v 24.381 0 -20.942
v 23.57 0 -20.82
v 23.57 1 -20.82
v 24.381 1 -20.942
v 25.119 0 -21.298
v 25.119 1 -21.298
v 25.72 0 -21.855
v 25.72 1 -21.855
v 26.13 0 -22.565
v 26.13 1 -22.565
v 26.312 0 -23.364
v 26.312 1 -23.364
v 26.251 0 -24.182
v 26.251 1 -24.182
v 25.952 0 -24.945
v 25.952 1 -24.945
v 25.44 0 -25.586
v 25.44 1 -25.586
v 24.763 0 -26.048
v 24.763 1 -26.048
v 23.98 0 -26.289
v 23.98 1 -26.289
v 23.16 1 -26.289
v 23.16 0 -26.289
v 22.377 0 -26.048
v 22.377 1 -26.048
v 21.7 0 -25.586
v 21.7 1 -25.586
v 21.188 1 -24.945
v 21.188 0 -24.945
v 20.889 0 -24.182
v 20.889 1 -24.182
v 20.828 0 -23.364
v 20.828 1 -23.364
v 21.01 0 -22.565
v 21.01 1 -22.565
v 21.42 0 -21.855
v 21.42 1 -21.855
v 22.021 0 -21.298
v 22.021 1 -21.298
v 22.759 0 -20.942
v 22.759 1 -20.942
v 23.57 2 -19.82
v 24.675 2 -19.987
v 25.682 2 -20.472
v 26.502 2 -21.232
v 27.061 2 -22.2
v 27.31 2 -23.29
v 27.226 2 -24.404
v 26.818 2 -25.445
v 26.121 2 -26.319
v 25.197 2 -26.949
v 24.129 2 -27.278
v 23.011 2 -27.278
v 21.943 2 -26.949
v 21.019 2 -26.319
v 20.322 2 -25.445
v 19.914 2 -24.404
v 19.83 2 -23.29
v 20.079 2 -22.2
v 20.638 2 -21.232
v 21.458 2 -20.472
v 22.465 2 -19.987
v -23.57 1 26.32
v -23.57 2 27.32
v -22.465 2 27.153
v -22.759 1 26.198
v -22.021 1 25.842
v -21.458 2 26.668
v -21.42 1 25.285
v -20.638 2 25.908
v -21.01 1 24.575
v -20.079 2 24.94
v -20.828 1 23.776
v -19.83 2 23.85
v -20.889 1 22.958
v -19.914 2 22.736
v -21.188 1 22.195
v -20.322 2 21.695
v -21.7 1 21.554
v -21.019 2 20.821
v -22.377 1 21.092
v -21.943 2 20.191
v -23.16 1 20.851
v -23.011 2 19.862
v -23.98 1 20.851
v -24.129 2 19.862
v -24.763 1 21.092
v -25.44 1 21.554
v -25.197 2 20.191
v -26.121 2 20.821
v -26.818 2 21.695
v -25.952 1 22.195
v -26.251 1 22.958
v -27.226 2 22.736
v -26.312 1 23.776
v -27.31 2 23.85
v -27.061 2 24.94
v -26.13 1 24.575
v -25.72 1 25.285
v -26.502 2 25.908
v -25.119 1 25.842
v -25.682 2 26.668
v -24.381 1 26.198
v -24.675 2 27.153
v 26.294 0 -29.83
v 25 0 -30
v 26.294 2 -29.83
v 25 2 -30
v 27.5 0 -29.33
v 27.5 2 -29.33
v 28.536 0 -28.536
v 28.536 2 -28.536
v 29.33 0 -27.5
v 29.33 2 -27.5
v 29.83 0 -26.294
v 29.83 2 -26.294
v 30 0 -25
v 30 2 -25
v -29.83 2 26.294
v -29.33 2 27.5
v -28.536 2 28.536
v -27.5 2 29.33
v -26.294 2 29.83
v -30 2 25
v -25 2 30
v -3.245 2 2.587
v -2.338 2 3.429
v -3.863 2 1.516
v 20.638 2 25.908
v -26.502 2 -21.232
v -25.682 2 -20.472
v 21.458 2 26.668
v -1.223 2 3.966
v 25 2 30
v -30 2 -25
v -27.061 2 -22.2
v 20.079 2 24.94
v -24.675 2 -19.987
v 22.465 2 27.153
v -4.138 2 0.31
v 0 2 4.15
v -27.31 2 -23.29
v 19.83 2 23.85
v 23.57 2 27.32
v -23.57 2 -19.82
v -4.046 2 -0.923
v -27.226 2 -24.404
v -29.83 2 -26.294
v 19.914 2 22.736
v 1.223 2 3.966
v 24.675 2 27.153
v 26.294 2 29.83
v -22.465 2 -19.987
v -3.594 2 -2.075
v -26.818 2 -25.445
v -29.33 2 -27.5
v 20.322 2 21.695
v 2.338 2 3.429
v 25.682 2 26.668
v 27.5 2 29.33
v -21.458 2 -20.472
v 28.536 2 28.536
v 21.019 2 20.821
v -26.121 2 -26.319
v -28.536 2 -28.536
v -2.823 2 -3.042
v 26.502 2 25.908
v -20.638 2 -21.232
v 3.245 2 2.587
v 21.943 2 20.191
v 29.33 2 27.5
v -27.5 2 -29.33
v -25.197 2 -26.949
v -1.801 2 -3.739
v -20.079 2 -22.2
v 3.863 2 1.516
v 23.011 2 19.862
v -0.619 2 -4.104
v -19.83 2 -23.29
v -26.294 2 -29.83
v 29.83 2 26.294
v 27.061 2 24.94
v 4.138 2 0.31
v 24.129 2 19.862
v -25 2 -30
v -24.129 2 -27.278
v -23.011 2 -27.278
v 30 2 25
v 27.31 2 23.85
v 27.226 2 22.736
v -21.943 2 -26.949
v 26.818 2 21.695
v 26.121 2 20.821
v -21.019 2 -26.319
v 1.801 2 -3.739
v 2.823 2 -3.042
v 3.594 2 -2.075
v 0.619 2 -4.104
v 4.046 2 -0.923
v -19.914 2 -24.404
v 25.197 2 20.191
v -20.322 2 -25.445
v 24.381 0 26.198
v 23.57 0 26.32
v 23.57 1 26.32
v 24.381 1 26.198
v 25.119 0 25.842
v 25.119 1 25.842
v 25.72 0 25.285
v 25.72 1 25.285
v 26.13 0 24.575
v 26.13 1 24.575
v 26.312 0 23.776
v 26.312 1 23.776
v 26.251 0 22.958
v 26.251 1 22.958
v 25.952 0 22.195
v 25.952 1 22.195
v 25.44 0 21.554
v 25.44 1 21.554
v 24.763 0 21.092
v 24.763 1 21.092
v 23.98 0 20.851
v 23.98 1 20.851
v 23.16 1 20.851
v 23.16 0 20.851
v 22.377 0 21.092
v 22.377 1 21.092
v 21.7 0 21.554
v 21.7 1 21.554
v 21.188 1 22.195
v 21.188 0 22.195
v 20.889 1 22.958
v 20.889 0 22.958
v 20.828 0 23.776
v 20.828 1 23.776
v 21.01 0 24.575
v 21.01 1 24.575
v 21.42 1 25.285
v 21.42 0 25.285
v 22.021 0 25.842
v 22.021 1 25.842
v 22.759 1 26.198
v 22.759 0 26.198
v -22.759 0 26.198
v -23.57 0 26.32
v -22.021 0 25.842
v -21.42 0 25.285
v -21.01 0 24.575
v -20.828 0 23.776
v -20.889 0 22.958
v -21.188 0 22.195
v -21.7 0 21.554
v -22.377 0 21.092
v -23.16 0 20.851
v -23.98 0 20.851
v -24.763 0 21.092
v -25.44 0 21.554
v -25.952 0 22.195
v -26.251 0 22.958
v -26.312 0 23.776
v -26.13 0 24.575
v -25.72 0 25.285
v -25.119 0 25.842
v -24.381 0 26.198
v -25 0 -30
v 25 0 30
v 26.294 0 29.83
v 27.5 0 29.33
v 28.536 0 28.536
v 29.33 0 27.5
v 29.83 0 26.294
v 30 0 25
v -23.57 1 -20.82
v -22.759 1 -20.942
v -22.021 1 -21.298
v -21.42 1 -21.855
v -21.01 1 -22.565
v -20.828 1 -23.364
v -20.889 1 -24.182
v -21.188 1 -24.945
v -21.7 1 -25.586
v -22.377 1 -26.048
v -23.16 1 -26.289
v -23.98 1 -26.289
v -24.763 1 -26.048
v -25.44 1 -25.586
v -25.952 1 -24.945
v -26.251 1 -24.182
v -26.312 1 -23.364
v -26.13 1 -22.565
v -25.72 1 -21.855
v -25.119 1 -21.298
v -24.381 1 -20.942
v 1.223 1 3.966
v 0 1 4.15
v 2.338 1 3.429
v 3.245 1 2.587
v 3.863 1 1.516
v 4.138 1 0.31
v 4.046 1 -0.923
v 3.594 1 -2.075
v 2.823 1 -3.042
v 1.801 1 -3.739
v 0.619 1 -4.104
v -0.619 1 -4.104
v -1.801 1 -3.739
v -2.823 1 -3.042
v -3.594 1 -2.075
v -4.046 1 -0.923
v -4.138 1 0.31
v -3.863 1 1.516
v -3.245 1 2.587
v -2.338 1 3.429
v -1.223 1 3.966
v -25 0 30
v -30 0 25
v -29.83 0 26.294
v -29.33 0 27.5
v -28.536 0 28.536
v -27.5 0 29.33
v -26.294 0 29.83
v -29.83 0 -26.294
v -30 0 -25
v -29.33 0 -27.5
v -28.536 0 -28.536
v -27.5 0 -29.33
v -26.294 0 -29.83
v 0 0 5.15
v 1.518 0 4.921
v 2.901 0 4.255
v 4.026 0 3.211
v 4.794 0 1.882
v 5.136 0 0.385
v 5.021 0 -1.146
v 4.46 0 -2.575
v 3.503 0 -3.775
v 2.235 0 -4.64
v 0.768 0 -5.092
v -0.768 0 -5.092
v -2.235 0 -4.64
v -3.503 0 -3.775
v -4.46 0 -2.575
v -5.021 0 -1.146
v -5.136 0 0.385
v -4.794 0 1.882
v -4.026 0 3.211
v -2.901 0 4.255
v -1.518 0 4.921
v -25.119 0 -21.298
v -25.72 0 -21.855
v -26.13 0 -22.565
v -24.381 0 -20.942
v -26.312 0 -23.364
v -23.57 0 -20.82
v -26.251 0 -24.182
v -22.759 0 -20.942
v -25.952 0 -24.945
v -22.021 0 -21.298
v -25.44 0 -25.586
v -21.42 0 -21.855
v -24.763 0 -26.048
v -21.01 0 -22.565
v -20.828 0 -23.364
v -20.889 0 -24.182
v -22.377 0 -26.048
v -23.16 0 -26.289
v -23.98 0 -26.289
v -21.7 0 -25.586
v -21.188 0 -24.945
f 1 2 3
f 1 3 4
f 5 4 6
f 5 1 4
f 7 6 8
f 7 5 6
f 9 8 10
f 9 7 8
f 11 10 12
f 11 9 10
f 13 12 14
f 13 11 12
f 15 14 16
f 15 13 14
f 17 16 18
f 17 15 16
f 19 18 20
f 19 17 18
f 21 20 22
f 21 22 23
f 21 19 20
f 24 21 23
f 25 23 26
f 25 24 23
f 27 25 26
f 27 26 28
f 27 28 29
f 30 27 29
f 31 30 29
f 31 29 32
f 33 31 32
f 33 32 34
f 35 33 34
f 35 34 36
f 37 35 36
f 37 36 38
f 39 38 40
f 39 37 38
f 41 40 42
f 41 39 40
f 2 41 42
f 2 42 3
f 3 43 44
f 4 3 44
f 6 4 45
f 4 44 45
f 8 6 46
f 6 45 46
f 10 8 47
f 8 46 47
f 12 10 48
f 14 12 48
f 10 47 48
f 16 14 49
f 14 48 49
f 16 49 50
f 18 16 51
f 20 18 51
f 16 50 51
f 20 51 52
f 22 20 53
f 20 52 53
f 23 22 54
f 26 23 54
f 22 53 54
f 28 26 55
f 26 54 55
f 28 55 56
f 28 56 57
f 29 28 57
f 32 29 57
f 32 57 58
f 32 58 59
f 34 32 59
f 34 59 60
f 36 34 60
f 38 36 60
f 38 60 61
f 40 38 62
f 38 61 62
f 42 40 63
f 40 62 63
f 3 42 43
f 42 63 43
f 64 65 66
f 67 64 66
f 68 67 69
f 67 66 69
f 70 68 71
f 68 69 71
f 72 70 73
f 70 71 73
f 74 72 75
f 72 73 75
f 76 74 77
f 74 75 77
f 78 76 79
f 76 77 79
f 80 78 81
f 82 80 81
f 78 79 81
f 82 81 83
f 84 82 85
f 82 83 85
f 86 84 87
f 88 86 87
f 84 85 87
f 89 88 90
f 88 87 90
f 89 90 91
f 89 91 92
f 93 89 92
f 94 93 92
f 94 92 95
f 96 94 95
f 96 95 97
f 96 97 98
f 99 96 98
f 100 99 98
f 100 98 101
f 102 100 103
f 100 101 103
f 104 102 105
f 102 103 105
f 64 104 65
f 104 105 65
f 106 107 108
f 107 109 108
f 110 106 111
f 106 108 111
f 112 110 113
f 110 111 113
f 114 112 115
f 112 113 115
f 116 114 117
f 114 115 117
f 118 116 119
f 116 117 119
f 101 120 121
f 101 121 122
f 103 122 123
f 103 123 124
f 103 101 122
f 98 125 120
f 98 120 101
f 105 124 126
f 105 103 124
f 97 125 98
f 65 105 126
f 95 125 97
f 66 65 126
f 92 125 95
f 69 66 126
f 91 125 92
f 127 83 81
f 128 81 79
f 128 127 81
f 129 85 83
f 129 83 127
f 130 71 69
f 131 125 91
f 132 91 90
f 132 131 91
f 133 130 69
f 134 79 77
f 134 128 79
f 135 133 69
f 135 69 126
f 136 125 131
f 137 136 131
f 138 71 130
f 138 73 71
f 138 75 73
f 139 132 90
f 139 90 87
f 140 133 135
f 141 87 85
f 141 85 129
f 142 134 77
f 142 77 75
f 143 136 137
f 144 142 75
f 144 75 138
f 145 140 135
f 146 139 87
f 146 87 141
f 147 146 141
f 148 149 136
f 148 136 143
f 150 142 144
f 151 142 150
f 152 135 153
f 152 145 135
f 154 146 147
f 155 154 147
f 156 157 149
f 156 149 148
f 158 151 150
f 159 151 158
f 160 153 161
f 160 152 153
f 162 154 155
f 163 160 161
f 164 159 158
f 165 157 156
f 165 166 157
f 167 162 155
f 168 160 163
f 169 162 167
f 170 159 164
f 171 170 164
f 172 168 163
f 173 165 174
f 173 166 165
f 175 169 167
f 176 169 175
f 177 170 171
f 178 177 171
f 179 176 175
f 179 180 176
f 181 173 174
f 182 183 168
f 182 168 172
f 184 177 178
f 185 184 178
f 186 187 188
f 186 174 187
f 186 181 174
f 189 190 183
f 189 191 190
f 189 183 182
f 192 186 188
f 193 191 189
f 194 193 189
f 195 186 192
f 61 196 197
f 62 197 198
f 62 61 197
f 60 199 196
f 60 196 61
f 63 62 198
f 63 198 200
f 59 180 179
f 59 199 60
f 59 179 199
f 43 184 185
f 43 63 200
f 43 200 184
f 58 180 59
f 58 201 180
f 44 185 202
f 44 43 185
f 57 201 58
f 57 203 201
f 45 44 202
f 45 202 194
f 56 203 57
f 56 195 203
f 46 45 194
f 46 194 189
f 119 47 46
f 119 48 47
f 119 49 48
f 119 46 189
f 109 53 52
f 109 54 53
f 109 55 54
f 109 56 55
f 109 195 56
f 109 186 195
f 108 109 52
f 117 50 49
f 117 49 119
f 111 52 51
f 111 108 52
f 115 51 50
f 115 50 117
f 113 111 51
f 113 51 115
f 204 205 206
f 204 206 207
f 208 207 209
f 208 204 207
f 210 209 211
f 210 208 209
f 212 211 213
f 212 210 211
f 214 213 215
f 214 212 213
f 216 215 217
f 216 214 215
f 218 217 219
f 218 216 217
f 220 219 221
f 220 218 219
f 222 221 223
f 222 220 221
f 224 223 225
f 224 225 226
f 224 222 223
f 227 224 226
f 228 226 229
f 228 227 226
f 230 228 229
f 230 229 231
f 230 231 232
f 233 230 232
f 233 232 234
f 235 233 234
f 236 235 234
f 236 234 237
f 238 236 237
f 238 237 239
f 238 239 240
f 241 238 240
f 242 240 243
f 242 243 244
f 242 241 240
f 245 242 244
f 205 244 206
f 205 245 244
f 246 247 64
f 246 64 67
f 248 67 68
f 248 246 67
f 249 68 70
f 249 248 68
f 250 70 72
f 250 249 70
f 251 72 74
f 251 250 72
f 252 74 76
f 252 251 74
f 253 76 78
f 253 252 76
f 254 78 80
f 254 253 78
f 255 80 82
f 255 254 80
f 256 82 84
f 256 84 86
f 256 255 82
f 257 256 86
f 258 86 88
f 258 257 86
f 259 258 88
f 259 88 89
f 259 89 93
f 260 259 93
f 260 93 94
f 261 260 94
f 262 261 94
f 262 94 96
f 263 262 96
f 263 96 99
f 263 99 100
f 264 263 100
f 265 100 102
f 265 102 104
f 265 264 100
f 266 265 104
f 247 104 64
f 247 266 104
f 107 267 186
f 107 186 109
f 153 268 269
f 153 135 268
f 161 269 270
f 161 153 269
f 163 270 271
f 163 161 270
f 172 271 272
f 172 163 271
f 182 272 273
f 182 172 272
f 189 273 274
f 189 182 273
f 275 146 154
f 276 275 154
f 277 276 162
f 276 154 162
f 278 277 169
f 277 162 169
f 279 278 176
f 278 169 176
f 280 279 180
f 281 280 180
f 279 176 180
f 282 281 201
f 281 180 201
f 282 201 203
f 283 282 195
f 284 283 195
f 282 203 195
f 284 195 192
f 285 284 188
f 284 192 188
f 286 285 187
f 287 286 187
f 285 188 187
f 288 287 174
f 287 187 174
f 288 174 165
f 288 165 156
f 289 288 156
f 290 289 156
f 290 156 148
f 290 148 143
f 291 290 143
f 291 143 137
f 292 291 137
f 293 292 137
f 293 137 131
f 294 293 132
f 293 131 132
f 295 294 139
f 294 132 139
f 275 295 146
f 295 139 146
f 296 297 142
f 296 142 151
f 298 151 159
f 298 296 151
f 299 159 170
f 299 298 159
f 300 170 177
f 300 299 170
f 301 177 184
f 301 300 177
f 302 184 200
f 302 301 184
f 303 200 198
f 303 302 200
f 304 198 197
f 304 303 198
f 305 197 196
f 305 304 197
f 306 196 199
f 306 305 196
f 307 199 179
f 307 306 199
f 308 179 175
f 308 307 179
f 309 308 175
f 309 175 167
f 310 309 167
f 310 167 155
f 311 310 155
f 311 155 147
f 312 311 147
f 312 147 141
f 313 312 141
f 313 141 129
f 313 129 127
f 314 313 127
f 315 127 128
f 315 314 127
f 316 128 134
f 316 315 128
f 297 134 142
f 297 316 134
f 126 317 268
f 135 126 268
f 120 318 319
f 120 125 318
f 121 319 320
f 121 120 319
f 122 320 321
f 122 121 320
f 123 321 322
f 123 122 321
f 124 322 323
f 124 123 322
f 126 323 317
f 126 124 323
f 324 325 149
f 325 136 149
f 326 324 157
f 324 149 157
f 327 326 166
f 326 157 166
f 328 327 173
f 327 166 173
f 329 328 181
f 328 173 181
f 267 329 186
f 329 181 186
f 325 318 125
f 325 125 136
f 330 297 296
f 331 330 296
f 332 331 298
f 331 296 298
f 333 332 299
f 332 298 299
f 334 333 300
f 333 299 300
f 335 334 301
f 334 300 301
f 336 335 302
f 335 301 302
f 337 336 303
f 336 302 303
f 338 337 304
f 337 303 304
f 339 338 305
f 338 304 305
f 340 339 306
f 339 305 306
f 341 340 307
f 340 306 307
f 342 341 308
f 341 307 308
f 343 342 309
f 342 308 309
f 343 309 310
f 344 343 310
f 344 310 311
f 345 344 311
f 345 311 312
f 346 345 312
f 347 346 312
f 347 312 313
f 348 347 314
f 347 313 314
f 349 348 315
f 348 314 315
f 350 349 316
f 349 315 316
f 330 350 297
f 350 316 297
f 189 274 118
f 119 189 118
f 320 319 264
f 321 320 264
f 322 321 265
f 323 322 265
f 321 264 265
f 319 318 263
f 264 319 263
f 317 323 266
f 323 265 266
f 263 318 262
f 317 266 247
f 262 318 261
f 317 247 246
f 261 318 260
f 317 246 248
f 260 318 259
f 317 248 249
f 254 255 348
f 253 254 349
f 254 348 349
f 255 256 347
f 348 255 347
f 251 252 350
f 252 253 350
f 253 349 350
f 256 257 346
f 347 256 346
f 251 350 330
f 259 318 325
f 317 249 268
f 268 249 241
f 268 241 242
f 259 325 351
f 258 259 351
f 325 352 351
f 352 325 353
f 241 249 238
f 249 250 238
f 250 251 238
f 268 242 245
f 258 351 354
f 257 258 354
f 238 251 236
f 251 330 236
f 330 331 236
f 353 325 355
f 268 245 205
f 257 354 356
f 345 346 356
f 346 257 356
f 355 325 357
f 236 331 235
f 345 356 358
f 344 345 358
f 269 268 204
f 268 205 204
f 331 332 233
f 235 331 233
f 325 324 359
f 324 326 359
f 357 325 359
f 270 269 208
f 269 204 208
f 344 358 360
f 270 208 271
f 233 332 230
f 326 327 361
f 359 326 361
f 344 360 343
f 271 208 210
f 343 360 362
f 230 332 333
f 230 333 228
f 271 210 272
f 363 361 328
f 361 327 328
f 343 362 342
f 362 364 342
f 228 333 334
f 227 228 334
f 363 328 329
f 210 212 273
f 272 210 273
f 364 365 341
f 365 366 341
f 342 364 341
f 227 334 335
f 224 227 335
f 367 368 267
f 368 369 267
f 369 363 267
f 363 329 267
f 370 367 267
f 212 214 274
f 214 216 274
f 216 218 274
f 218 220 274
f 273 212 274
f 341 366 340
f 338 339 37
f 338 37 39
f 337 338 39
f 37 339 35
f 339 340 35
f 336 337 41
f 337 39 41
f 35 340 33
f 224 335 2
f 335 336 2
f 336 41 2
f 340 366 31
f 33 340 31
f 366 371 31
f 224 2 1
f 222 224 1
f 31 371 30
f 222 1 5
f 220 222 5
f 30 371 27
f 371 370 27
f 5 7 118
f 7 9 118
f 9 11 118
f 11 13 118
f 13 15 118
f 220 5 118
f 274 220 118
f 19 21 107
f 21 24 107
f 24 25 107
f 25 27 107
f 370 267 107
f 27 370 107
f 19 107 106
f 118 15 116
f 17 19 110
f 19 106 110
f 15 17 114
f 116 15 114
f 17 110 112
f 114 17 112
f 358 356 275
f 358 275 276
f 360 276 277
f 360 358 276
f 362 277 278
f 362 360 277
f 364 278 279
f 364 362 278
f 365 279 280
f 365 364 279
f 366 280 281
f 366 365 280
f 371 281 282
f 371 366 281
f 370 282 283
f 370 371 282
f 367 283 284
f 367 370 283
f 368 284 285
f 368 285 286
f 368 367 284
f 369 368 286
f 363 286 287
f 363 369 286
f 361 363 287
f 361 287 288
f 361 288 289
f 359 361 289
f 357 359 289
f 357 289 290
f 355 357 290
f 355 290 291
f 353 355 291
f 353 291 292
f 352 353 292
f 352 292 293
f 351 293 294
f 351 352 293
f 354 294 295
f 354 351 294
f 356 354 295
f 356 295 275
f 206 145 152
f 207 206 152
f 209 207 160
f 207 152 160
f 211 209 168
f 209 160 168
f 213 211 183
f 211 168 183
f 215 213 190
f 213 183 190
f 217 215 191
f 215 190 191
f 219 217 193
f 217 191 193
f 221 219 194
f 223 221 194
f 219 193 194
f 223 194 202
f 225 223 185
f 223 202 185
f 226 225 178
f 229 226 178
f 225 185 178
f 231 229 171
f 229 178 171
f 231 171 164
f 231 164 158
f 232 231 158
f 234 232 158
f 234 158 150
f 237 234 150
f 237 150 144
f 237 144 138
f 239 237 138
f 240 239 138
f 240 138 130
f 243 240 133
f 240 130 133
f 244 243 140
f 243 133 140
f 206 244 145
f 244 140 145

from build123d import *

# Parameters (mm, degrees)
SKETCH1_R           = 4.150000000000041
BOSS_EXTRUDE1_DEPTH = 2
CHAMFER1_SIZE       = 1
CHAMFER2_SIZE       = 1
FILLET1_R           = 5


with BuildPart() as part:
    # Sketch1 → Boss-Extrude1 (new body)
    with BuildSketch(Plane(origin=(0, 0, 0), x_dir=(1, 0, 0), z_dir=(0, 1, 0))):
        Polygon((30.00000000000003, 30.000000000000025), (-29.999999999999986, 30.000000000000025), (-29.99999999999997, -29.999999999999975), (30.00000000000003, -29.999999999999975), align=None)
        with BuildLine():
            ThreePointArc((-23.57000000000001, -20.819999999999983), (-21.625456351737007, -21.625456351736975), (-20.820000000000014, -23.56999999999998))
            ThreePointArc((-20.820000000000014, -23.56999999999998), (-25.514543648263015, -25.514543648262983), (-23.57000000000001, -20.819999999999983))
        make_face(mode=Mode.SUBTRACT)
        with BuildLine():
            ThreePointArc((26.319999999999983, -23.56999999999998), (23.569999999999986, -26.319999999999975), (20.81999999999999, -23.56999999999998))
            ThreePointArc((20.81999999999999, -23.56999999999998), (21.625456351736982, -21.625456351736975), (23.569999999999986, -20.819999999999983))
            ThreePointArc((23.569999999999986, -20.819999999999983), (25.51454364826299, -21.625456351736975), (26.319999999999983, -23.56999999999998))
        make_face(mode=Mode.SUBTRACT)
        with BuildLine():
            ThreePointArc((-23.57000000000002, 20.820000000000025), (-25.514543648263025, 25.514543648263025), (-20.820000000000025, 23.57000000000002))
            ThreePointArc((-20.820000000000025, 23.57000000000002), (-21.625456351737018, 21.625456351737018), (-23.57000000000002, 20.820000000000025))
        make_face(mode=Mode.SUBTRACT)
        Circle(SKETCH1_R, mode=Mode.SUBTRACT)
        with BuildLine():
            ThreePointArc((23.56999999999998, 20.820000000000025), (21.625456351736975, 21.625456351737018), (20.819999999999983, 23.57000000000002))
            ThreePointArc((20.819999999999983, 23.57000000000002), (23.56999999999998, 26.320000000000018), (26.319999999999975, 23.57000000000002))
            ThreePointArc((26.319999999999975, 23.57000000000002), (25.514543648262983, 21.625456351737018), (23.56999999999998, 20.820000000000025))
        make_face(mode=Mode.SUBTRACT)
    extrude(amount=BOSS_EXTRUDE1_DEPTH)

    # Chamfer1
    chamfer1_edges = [part.edges().sort_by_distance(p)[0] for p in [
        (20.819999999999983, 2, -23.57000000000002),
        (23.569999999999972, 2, 26.31999999999996),
        (-23.57000000000001, 2, 26.319999999999975),
        (-26.320000000000018, 2, -23.57000000000002),
    ]]
    chamfer(chamfer1_edges, length=CHAMFER1_SIZE)

    # Chamfer2
    chamfer2_edges = [part.edges().sort_by_distance(p)[0] for p in [
        (-4.150000000000013, 0, -2.356e-14),
    ]]
    chamfer(chamfer2_edges, length=CHAMFER2_SIZE)

    # Fillet1
    fillet1_edges = [part.edges().sort_by_distance(p)[0] for p in [
        (-29.999999999999986, 1, -30.000000000000025),
        (30.00000000000003, 1, -30.000000000000025),
        (-29.99999999999997, 1, 29.999999999999975),
        (30.00000000000003, 1, 29.999999999999975),
    ]]
    fillet(fillet1_edges, radius=FILLET1_R)


solid = part.part
